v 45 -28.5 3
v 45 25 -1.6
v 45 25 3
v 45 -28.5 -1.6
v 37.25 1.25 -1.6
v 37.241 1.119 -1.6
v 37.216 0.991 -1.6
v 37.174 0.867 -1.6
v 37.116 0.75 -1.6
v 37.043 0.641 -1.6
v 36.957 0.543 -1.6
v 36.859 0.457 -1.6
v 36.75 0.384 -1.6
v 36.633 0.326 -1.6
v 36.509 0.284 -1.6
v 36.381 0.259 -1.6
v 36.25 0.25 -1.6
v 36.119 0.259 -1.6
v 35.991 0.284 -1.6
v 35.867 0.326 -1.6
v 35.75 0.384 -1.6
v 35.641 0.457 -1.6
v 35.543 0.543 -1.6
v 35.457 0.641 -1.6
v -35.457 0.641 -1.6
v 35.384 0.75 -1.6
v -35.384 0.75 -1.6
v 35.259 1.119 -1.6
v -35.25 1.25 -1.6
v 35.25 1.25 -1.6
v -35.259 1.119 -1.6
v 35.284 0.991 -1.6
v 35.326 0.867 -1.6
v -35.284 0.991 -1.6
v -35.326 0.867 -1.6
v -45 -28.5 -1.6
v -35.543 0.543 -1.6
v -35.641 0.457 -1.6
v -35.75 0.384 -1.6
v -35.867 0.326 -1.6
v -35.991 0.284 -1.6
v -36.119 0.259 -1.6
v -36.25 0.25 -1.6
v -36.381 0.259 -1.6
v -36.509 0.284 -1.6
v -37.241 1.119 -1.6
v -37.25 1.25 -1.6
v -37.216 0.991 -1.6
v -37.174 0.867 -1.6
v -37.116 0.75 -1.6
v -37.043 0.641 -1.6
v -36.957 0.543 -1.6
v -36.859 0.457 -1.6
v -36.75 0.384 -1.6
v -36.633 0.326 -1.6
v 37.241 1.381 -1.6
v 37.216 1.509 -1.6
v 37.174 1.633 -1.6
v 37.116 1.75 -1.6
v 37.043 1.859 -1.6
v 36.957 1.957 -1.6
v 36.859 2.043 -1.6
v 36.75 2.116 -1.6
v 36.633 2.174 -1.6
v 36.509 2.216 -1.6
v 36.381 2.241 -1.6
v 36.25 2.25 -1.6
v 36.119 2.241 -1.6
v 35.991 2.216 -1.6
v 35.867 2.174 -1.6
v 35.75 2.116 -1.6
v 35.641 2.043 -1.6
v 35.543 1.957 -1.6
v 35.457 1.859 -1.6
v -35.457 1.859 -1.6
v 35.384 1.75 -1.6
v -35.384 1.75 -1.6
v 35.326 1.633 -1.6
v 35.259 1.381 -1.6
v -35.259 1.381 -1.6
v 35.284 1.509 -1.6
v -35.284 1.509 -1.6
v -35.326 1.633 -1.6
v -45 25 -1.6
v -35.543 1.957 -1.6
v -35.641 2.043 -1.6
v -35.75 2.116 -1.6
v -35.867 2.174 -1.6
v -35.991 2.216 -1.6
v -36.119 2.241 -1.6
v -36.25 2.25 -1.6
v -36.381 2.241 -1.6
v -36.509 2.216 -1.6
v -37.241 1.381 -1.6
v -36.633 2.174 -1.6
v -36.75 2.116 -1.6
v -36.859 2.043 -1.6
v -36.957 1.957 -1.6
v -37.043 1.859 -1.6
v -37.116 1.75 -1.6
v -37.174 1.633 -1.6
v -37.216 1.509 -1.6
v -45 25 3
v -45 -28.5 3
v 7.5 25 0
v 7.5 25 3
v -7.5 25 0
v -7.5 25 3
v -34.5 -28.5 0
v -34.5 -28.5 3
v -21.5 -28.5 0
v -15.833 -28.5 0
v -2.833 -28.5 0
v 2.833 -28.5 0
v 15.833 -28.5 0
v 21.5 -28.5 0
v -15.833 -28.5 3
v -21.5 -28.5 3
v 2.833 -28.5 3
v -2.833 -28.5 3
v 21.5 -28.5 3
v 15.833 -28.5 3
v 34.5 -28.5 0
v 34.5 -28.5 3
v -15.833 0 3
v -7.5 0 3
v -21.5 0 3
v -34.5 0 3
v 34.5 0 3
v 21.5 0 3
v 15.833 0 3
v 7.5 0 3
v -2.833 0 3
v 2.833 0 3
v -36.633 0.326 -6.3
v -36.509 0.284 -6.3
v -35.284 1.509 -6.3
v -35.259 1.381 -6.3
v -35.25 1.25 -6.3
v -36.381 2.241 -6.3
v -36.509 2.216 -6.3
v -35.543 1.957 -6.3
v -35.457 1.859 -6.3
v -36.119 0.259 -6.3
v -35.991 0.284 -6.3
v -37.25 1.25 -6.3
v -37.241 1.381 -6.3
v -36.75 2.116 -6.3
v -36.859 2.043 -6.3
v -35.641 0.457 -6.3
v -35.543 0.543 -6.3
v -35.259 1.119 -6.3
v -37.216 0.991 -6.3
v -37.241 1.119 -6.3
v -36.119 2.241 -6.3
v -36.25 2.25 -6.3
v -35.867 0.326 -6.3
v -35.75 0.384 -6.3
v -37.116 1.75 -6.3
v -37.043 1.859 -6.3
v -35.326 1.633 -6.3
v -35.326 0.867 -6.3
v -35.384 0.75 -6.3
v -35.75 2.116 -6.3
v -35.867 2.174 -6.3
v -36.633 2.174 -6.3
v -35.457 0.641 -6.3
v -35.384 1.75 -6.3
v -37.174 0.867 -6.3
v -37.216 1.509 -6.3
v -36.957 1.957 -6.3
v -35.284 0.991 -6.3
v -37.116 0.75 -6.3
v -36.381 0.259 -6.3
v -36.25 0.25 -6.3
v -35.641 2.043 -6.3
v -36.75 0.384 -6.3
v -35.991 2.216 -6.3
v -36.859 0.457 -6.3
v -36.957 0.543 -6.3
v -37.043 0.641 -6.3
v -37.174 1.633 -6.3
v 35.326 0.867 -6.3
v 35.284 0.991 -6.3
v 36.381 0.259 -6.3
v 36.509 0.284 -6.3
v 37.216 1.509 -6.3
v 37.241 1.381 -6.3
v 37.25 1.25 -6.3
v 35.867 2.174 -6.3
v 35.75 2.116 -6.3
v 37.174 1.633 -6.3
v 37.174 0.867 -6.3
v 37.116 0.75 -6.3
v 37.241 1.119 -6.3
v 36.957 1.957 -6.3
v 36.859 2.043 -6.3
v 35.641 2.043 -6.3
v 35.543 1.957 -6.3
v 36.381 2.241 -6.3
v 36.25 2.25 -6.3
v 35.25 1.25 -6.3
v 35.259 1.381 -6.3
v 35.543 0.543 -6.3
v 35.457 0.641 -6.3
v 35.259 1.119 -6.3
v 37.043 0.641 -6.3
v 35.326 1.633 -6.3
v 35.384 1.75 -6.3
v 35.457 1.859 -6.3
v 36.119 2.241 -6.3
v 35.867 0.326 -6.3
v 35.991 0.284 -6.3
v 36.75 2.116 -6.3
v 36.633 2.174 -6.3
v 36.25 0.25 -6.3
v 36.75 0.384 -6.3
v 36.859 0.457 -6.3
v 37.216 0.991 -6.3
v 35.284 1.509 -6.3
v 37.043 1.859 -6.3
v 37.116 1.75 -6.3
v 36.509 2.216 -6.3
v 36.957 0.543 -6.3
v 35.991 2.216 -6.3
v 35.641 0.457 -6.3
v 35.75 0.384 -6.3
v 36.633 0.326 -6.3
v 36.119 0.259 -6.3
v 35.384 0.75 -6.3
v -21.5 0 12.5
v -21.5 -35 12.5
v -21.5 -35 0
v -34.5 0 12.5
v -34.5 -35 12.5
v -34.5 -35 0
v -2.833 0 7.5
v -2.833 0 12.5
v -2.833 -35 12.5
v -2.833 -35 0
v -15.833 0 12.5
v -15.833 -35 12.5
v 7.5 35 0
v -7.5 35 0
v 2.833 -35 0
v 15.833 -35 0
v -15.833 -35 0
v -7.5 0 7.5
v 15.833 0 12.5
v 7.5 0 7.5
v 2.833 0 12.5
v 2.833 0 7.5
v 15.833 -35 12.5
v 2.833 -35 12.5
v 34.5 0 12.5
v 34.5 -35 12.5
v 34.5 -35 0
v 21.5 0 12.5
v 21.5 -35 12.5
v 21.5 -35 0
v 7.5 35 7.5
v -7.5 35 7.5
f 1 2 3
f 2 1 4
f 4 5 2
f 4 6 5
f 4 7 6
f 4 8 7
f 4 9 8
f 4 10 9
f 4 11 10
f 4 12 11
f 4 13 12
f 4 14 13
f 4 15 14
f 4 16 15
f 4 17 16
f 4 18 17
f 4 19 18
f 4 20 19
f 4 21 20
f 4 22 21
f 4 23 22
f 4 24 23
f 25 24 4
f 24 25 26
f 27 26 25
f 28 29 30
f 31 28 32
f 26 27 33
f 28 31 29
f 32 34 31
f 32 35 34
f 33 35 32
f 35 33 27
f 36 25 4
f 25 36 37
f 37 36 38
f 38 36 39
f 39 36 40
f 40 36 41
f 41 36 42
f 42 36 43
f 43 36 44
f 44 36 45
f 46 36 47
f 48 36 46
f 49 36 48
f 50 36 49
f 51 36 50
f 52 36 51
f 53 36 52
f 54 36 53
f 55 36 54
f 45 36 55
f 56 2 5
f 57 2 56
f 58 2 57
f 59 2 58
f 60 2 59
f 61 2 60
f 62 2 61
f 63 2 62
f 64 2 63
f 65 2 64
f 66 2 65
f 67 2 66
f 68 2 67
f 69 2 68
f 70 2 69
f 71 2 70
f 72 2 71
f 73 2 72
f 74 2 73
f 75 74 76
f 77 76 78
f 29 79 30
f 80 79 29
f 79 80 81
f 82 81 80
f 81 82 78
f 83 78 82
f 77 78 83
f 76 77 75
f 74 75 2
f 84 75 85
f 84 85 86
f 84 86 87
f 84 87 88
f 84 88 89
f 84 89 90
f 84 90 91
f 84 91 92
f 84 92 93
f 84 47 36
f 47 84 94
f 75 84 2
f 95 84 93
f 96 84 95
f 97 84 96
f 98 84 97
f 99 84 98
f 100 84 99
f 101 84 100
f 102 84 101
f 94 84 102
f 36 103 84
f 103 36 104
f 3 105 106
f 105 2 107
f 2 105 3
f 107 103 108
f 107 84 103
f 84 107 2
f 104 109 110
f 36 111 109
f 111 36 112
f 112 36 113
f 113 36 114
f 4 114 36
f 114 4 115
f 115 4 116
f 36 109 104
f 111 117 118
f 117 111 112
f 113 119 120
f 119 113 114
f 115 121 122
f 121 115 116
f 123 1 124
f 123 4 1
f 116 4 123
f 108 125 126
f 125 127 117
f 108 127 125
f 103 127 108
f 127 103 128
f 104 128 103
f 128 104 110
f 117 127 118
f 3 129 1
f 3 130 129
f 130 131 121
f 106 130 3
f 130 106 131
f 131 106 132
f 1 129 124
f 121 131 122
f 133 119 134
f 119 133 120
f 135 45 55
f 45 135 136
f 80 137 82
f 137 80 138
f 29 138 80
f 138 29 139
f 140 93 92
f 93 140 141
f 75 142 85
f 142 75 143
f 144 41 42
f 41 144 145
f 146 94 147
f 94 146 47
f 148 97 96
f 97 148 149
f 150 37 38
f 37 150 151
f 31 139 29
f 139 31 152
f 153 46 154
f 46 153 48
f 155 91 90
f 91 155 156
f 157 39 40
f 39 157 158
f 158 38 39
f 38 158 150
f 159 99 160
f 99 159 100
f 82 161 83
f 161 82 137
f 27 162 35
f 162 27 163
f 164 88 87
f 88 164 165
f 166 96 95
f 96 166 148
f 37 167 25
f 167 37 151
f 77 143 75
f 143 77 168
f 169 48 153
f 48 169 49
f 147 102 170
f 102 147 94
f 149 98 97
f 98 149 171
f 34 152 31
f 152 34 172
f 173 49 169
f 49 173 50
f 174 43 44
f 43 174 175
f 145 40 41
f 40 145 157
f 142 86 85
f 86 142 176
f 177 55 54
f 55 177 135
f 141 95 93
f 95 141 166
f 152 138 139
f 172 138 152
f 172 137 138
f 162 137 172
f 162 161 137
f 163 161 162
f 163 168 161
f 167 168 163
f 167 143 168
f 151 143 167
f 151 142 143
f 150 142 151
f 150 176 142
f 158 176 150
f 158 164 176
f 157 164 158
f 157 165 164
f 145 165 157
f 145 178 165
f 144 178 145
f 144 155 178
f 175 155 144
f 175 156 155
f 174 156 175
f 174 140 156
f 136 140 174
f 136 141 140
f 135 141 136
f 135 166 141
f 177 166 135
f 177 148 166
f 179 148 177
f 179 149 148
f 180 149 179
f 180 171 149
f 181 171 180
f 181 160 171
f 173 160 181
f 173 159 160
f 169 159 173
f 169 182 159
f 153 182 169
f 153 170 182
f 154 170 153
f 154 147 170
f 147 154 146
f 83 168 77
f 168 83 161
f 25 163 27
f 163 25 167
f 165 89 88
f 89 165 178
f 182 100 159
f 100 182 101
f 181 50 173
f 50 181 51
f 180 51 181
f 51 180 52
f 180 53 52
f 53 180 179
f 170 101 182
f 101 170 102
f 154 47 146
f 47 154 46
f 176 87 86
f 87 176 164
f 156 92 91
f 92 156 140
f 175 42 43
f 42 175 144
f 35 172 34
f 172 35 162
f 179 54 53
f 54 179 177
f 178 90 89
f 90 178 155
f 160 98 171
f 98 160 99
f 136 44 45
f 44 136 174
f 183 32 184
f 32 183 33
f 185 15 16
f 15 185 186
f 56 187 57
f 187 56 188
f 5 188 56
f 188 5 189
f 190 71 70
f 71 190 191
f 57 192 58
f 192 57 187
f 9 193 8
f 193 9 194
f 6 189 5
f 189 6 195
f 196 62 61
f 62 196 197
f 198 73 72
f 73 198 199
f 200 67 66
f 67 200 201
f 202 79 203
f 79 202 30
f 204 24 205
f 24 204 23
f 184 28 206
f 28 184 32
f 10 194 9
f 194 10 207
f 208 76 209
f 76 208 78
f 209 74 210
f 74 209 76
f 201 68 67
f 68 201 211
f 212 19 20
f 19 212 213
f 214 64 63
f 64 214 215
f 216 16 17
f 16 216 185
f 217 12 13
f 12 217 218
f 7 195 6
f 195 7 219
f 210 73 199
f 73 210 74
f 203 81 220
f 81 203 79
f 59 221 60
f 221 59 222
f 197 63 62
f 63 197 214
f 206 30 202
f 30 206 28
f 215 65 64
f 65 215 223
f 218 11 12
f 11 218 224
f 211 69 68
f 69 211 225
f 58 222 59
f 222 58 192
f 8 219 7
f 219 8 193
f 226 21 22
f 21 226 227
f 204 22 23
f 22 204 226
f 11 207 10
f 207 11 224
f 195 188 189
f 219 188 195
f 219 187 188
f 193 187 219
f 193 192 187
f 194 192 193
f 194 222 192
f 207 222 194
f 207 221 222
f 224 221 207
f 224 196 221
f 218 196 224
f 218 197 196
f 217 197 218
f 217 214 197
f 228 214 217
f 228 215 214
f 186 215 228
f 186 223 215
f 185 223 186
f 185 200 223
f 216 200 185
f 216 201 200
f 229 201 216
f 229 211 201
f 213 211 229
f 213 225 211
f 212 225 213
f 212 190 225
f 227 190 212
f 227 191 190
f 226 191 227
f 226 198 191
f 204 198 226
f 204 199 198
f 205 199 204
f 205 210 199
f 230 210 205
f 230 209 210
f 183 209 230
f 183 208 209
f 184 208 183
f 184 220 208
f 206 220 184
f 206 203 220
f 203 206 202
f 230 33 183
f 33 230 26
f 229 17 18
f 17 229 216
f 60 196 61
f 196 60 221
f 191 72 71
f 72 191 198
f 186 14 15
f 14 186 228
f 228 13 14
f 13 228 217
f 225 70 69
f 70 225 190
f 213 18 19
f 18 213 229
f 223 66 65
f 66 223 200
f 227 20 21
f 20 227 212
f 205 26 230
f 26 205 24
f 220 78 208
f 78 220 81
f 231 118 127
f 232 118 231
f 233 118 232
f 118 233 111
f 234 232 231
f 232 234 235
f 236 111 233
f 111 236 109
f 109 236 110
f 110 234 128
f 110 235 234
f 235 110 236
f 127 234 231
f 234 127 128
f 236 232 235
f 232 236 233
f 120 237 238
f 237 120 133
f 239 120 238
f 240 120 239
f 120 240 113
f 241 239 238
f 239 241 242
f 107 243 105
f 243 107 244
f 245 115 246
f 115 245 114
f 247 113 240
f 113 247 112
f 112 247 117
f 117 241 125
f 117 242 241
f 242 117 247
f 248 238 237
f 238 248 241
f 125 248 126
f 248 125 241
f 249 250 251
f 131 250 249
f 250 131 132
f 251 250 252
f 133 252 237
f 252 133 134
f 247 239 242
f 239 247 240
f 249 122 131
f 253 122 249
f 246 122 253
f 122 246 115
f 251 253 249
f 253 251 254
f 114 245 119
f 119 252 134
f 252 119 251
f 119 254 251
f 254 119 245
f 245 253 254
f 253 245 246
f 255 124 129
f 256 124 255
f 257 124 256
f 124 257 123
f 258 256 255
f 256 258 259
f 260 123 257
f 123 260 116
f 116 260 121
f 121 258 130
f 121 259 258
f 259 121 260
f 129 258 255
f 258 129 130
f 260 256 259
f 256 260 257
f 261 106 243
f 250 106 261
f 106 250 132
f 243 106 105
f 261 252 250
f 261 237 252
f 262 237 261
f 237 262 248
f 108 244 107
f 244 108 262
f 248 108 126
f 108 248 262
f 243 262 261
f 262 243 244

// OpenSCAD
// Generated by SolidPython 1.1.1 on 2021-05-17 21:24:03
$fn = 48;


union() {
	translate(v = [0, -1.7500000000, -0.8000000000]) {
		union() {
			cube(center = true, size = [90.0000000000, 53.5000000000, 1.6000000000]);
			translate(v = [0, 0, 2.3000000000]) {
				cube(center = true, size = [90.0000000000, 53.5000000000, 3]);
			}
			translate(v = [-36.2500000000, 3, -3]) {
				cylinder(center = true, d = 2, h = 5);
			}
			translate(v = [36.2500000000, 3, -3]) {
				cylinder(center = true, d = 2, h = 5);
			}
		}
	}
	translate(v = [0, 17.5000000000, 3.7500000000]) {
		cube(center = true, size = [15, 35, 7.5000000000]);
	}
	union() {
		translate(v = [-28.0000000000, -17.5000000000, 6.2500000000]) {
			cube(center = true, size = [13, 35, 12.5000000000]);
		}
		translate(v = [-9.3333333333, -17.5000000000, 6.2500000000]) {
			cube(center = true, size = [13, 35, 12.5000000000]);
		}
		translate(v = [9.3333333333, -17.5000000000, 6.2500000000]) {
			cube(center = true, size = [13, 35, 12.5000000000]);
		}
		translate(v = [28.0000000000, -17.5000000000, 6.2500000000]) {
			cube(center = true, size = [13, 35, 12.5000000000]);
		}
	}
}
/***********************************************
*********      SolidPython code:      **********
************************************************
 
from dataclasses import dataclass
from solid import *
from solid.utils import *


@dataclass
class CoreUsbDevice:
    size_x = 15
    size_z = 7.5
    size_y_dummy = 35

    def draw(self):
        return translate(v=[0, self.size_y_dummy / 2, self.size_z / 2])(
            cube(size=[self.size_x, self.size_y_dummy, self.size_z], center=True)
        )


@dataclass
class CoreUsbPC:
    size_x = 13
    size_z = 12.5
    dx = 56 / 3
    thickness_dummy = 35

    def draw(self):
        pcb = union()
        for i in [-1.5, -0.5, 0.5, 1.5]:
            x = self.dx * i
            pcb += translate(v=[x, -self.thickness_dummy / 2, self.size_z / 2])(
                cube(size=[self.size_x, self.thickness_dummy, self.size_z], center=True)
            )
        return pcb


@dataclass
class CoreBcb:
    """
    X-centered to the pcb border.
    Y-centered to the usb connectors.
    The z-zero is the top of the pcb.
    """

    size_x = 90.0
    size_y = 53.5
    usb_overall_y = 66
    usb_PC_overhead_y = 4.5
    offset_y = -(usb_overall_y / 2 - usb_PC_overhead_y - size_y / 2)
    # pcb_y = 53.5 / 2 + 8.5  # Distance between device usb and center pcb
    screws_distance_x = 72.5
    screws_distance_y = 1  # The y offset of the screws to the case - Needs to be calculated correctly
    screws_y = 3  # Distance between screens and center pcb
    screws_dummy_length = 5
    screws_d = 2
    soldering_thickness = 2
    pcb_thickness = 1.6
    pcp_support_z_over = 3

    def draw(self):
        # PCB
        pcb = union()

        pcb += cube(size=[self.size_x, self.size_y, self.pcb_thickness], center=True)

        pcb += translate(v=[0, 0, (self.pcb_thickness + self.pcp_support_z_over) / 2])(
            cube(size=[self.size_x, self.size_y, self.pcp_support_z_over], center=True)
        )

        for x in [-self.screws_distance_x / 2, self.screws_distance_x / 2]:
            pcb += translate(
                v=[
                    x,
                    self.screws_y,
                    self.soldering_thickness - self.screws_dummy_length,
                ]
            )(
                # Screws
                cylinder(d=self.screws_d, h=self.screws_dummy_length, center=True)
            )
        return translate(v=[0, self.offset_y, -self.pcb_thickness / 2])(pcb)


@dataclass
class CorePcbAssembled:
    core_pcb = CoreBcb()

    def draw(self):
        return union()(self.core_pcb.draw(), CoreUsbDevice().draw(), CoreUsbPC().draw())


SEGMENTS = 48

d = CorePcbAssembled().draw()

scad_render_to_file(d, file_header=f"$fn = {SEGMENTS};", include_orig_code=True)
 
 
************************************************/
